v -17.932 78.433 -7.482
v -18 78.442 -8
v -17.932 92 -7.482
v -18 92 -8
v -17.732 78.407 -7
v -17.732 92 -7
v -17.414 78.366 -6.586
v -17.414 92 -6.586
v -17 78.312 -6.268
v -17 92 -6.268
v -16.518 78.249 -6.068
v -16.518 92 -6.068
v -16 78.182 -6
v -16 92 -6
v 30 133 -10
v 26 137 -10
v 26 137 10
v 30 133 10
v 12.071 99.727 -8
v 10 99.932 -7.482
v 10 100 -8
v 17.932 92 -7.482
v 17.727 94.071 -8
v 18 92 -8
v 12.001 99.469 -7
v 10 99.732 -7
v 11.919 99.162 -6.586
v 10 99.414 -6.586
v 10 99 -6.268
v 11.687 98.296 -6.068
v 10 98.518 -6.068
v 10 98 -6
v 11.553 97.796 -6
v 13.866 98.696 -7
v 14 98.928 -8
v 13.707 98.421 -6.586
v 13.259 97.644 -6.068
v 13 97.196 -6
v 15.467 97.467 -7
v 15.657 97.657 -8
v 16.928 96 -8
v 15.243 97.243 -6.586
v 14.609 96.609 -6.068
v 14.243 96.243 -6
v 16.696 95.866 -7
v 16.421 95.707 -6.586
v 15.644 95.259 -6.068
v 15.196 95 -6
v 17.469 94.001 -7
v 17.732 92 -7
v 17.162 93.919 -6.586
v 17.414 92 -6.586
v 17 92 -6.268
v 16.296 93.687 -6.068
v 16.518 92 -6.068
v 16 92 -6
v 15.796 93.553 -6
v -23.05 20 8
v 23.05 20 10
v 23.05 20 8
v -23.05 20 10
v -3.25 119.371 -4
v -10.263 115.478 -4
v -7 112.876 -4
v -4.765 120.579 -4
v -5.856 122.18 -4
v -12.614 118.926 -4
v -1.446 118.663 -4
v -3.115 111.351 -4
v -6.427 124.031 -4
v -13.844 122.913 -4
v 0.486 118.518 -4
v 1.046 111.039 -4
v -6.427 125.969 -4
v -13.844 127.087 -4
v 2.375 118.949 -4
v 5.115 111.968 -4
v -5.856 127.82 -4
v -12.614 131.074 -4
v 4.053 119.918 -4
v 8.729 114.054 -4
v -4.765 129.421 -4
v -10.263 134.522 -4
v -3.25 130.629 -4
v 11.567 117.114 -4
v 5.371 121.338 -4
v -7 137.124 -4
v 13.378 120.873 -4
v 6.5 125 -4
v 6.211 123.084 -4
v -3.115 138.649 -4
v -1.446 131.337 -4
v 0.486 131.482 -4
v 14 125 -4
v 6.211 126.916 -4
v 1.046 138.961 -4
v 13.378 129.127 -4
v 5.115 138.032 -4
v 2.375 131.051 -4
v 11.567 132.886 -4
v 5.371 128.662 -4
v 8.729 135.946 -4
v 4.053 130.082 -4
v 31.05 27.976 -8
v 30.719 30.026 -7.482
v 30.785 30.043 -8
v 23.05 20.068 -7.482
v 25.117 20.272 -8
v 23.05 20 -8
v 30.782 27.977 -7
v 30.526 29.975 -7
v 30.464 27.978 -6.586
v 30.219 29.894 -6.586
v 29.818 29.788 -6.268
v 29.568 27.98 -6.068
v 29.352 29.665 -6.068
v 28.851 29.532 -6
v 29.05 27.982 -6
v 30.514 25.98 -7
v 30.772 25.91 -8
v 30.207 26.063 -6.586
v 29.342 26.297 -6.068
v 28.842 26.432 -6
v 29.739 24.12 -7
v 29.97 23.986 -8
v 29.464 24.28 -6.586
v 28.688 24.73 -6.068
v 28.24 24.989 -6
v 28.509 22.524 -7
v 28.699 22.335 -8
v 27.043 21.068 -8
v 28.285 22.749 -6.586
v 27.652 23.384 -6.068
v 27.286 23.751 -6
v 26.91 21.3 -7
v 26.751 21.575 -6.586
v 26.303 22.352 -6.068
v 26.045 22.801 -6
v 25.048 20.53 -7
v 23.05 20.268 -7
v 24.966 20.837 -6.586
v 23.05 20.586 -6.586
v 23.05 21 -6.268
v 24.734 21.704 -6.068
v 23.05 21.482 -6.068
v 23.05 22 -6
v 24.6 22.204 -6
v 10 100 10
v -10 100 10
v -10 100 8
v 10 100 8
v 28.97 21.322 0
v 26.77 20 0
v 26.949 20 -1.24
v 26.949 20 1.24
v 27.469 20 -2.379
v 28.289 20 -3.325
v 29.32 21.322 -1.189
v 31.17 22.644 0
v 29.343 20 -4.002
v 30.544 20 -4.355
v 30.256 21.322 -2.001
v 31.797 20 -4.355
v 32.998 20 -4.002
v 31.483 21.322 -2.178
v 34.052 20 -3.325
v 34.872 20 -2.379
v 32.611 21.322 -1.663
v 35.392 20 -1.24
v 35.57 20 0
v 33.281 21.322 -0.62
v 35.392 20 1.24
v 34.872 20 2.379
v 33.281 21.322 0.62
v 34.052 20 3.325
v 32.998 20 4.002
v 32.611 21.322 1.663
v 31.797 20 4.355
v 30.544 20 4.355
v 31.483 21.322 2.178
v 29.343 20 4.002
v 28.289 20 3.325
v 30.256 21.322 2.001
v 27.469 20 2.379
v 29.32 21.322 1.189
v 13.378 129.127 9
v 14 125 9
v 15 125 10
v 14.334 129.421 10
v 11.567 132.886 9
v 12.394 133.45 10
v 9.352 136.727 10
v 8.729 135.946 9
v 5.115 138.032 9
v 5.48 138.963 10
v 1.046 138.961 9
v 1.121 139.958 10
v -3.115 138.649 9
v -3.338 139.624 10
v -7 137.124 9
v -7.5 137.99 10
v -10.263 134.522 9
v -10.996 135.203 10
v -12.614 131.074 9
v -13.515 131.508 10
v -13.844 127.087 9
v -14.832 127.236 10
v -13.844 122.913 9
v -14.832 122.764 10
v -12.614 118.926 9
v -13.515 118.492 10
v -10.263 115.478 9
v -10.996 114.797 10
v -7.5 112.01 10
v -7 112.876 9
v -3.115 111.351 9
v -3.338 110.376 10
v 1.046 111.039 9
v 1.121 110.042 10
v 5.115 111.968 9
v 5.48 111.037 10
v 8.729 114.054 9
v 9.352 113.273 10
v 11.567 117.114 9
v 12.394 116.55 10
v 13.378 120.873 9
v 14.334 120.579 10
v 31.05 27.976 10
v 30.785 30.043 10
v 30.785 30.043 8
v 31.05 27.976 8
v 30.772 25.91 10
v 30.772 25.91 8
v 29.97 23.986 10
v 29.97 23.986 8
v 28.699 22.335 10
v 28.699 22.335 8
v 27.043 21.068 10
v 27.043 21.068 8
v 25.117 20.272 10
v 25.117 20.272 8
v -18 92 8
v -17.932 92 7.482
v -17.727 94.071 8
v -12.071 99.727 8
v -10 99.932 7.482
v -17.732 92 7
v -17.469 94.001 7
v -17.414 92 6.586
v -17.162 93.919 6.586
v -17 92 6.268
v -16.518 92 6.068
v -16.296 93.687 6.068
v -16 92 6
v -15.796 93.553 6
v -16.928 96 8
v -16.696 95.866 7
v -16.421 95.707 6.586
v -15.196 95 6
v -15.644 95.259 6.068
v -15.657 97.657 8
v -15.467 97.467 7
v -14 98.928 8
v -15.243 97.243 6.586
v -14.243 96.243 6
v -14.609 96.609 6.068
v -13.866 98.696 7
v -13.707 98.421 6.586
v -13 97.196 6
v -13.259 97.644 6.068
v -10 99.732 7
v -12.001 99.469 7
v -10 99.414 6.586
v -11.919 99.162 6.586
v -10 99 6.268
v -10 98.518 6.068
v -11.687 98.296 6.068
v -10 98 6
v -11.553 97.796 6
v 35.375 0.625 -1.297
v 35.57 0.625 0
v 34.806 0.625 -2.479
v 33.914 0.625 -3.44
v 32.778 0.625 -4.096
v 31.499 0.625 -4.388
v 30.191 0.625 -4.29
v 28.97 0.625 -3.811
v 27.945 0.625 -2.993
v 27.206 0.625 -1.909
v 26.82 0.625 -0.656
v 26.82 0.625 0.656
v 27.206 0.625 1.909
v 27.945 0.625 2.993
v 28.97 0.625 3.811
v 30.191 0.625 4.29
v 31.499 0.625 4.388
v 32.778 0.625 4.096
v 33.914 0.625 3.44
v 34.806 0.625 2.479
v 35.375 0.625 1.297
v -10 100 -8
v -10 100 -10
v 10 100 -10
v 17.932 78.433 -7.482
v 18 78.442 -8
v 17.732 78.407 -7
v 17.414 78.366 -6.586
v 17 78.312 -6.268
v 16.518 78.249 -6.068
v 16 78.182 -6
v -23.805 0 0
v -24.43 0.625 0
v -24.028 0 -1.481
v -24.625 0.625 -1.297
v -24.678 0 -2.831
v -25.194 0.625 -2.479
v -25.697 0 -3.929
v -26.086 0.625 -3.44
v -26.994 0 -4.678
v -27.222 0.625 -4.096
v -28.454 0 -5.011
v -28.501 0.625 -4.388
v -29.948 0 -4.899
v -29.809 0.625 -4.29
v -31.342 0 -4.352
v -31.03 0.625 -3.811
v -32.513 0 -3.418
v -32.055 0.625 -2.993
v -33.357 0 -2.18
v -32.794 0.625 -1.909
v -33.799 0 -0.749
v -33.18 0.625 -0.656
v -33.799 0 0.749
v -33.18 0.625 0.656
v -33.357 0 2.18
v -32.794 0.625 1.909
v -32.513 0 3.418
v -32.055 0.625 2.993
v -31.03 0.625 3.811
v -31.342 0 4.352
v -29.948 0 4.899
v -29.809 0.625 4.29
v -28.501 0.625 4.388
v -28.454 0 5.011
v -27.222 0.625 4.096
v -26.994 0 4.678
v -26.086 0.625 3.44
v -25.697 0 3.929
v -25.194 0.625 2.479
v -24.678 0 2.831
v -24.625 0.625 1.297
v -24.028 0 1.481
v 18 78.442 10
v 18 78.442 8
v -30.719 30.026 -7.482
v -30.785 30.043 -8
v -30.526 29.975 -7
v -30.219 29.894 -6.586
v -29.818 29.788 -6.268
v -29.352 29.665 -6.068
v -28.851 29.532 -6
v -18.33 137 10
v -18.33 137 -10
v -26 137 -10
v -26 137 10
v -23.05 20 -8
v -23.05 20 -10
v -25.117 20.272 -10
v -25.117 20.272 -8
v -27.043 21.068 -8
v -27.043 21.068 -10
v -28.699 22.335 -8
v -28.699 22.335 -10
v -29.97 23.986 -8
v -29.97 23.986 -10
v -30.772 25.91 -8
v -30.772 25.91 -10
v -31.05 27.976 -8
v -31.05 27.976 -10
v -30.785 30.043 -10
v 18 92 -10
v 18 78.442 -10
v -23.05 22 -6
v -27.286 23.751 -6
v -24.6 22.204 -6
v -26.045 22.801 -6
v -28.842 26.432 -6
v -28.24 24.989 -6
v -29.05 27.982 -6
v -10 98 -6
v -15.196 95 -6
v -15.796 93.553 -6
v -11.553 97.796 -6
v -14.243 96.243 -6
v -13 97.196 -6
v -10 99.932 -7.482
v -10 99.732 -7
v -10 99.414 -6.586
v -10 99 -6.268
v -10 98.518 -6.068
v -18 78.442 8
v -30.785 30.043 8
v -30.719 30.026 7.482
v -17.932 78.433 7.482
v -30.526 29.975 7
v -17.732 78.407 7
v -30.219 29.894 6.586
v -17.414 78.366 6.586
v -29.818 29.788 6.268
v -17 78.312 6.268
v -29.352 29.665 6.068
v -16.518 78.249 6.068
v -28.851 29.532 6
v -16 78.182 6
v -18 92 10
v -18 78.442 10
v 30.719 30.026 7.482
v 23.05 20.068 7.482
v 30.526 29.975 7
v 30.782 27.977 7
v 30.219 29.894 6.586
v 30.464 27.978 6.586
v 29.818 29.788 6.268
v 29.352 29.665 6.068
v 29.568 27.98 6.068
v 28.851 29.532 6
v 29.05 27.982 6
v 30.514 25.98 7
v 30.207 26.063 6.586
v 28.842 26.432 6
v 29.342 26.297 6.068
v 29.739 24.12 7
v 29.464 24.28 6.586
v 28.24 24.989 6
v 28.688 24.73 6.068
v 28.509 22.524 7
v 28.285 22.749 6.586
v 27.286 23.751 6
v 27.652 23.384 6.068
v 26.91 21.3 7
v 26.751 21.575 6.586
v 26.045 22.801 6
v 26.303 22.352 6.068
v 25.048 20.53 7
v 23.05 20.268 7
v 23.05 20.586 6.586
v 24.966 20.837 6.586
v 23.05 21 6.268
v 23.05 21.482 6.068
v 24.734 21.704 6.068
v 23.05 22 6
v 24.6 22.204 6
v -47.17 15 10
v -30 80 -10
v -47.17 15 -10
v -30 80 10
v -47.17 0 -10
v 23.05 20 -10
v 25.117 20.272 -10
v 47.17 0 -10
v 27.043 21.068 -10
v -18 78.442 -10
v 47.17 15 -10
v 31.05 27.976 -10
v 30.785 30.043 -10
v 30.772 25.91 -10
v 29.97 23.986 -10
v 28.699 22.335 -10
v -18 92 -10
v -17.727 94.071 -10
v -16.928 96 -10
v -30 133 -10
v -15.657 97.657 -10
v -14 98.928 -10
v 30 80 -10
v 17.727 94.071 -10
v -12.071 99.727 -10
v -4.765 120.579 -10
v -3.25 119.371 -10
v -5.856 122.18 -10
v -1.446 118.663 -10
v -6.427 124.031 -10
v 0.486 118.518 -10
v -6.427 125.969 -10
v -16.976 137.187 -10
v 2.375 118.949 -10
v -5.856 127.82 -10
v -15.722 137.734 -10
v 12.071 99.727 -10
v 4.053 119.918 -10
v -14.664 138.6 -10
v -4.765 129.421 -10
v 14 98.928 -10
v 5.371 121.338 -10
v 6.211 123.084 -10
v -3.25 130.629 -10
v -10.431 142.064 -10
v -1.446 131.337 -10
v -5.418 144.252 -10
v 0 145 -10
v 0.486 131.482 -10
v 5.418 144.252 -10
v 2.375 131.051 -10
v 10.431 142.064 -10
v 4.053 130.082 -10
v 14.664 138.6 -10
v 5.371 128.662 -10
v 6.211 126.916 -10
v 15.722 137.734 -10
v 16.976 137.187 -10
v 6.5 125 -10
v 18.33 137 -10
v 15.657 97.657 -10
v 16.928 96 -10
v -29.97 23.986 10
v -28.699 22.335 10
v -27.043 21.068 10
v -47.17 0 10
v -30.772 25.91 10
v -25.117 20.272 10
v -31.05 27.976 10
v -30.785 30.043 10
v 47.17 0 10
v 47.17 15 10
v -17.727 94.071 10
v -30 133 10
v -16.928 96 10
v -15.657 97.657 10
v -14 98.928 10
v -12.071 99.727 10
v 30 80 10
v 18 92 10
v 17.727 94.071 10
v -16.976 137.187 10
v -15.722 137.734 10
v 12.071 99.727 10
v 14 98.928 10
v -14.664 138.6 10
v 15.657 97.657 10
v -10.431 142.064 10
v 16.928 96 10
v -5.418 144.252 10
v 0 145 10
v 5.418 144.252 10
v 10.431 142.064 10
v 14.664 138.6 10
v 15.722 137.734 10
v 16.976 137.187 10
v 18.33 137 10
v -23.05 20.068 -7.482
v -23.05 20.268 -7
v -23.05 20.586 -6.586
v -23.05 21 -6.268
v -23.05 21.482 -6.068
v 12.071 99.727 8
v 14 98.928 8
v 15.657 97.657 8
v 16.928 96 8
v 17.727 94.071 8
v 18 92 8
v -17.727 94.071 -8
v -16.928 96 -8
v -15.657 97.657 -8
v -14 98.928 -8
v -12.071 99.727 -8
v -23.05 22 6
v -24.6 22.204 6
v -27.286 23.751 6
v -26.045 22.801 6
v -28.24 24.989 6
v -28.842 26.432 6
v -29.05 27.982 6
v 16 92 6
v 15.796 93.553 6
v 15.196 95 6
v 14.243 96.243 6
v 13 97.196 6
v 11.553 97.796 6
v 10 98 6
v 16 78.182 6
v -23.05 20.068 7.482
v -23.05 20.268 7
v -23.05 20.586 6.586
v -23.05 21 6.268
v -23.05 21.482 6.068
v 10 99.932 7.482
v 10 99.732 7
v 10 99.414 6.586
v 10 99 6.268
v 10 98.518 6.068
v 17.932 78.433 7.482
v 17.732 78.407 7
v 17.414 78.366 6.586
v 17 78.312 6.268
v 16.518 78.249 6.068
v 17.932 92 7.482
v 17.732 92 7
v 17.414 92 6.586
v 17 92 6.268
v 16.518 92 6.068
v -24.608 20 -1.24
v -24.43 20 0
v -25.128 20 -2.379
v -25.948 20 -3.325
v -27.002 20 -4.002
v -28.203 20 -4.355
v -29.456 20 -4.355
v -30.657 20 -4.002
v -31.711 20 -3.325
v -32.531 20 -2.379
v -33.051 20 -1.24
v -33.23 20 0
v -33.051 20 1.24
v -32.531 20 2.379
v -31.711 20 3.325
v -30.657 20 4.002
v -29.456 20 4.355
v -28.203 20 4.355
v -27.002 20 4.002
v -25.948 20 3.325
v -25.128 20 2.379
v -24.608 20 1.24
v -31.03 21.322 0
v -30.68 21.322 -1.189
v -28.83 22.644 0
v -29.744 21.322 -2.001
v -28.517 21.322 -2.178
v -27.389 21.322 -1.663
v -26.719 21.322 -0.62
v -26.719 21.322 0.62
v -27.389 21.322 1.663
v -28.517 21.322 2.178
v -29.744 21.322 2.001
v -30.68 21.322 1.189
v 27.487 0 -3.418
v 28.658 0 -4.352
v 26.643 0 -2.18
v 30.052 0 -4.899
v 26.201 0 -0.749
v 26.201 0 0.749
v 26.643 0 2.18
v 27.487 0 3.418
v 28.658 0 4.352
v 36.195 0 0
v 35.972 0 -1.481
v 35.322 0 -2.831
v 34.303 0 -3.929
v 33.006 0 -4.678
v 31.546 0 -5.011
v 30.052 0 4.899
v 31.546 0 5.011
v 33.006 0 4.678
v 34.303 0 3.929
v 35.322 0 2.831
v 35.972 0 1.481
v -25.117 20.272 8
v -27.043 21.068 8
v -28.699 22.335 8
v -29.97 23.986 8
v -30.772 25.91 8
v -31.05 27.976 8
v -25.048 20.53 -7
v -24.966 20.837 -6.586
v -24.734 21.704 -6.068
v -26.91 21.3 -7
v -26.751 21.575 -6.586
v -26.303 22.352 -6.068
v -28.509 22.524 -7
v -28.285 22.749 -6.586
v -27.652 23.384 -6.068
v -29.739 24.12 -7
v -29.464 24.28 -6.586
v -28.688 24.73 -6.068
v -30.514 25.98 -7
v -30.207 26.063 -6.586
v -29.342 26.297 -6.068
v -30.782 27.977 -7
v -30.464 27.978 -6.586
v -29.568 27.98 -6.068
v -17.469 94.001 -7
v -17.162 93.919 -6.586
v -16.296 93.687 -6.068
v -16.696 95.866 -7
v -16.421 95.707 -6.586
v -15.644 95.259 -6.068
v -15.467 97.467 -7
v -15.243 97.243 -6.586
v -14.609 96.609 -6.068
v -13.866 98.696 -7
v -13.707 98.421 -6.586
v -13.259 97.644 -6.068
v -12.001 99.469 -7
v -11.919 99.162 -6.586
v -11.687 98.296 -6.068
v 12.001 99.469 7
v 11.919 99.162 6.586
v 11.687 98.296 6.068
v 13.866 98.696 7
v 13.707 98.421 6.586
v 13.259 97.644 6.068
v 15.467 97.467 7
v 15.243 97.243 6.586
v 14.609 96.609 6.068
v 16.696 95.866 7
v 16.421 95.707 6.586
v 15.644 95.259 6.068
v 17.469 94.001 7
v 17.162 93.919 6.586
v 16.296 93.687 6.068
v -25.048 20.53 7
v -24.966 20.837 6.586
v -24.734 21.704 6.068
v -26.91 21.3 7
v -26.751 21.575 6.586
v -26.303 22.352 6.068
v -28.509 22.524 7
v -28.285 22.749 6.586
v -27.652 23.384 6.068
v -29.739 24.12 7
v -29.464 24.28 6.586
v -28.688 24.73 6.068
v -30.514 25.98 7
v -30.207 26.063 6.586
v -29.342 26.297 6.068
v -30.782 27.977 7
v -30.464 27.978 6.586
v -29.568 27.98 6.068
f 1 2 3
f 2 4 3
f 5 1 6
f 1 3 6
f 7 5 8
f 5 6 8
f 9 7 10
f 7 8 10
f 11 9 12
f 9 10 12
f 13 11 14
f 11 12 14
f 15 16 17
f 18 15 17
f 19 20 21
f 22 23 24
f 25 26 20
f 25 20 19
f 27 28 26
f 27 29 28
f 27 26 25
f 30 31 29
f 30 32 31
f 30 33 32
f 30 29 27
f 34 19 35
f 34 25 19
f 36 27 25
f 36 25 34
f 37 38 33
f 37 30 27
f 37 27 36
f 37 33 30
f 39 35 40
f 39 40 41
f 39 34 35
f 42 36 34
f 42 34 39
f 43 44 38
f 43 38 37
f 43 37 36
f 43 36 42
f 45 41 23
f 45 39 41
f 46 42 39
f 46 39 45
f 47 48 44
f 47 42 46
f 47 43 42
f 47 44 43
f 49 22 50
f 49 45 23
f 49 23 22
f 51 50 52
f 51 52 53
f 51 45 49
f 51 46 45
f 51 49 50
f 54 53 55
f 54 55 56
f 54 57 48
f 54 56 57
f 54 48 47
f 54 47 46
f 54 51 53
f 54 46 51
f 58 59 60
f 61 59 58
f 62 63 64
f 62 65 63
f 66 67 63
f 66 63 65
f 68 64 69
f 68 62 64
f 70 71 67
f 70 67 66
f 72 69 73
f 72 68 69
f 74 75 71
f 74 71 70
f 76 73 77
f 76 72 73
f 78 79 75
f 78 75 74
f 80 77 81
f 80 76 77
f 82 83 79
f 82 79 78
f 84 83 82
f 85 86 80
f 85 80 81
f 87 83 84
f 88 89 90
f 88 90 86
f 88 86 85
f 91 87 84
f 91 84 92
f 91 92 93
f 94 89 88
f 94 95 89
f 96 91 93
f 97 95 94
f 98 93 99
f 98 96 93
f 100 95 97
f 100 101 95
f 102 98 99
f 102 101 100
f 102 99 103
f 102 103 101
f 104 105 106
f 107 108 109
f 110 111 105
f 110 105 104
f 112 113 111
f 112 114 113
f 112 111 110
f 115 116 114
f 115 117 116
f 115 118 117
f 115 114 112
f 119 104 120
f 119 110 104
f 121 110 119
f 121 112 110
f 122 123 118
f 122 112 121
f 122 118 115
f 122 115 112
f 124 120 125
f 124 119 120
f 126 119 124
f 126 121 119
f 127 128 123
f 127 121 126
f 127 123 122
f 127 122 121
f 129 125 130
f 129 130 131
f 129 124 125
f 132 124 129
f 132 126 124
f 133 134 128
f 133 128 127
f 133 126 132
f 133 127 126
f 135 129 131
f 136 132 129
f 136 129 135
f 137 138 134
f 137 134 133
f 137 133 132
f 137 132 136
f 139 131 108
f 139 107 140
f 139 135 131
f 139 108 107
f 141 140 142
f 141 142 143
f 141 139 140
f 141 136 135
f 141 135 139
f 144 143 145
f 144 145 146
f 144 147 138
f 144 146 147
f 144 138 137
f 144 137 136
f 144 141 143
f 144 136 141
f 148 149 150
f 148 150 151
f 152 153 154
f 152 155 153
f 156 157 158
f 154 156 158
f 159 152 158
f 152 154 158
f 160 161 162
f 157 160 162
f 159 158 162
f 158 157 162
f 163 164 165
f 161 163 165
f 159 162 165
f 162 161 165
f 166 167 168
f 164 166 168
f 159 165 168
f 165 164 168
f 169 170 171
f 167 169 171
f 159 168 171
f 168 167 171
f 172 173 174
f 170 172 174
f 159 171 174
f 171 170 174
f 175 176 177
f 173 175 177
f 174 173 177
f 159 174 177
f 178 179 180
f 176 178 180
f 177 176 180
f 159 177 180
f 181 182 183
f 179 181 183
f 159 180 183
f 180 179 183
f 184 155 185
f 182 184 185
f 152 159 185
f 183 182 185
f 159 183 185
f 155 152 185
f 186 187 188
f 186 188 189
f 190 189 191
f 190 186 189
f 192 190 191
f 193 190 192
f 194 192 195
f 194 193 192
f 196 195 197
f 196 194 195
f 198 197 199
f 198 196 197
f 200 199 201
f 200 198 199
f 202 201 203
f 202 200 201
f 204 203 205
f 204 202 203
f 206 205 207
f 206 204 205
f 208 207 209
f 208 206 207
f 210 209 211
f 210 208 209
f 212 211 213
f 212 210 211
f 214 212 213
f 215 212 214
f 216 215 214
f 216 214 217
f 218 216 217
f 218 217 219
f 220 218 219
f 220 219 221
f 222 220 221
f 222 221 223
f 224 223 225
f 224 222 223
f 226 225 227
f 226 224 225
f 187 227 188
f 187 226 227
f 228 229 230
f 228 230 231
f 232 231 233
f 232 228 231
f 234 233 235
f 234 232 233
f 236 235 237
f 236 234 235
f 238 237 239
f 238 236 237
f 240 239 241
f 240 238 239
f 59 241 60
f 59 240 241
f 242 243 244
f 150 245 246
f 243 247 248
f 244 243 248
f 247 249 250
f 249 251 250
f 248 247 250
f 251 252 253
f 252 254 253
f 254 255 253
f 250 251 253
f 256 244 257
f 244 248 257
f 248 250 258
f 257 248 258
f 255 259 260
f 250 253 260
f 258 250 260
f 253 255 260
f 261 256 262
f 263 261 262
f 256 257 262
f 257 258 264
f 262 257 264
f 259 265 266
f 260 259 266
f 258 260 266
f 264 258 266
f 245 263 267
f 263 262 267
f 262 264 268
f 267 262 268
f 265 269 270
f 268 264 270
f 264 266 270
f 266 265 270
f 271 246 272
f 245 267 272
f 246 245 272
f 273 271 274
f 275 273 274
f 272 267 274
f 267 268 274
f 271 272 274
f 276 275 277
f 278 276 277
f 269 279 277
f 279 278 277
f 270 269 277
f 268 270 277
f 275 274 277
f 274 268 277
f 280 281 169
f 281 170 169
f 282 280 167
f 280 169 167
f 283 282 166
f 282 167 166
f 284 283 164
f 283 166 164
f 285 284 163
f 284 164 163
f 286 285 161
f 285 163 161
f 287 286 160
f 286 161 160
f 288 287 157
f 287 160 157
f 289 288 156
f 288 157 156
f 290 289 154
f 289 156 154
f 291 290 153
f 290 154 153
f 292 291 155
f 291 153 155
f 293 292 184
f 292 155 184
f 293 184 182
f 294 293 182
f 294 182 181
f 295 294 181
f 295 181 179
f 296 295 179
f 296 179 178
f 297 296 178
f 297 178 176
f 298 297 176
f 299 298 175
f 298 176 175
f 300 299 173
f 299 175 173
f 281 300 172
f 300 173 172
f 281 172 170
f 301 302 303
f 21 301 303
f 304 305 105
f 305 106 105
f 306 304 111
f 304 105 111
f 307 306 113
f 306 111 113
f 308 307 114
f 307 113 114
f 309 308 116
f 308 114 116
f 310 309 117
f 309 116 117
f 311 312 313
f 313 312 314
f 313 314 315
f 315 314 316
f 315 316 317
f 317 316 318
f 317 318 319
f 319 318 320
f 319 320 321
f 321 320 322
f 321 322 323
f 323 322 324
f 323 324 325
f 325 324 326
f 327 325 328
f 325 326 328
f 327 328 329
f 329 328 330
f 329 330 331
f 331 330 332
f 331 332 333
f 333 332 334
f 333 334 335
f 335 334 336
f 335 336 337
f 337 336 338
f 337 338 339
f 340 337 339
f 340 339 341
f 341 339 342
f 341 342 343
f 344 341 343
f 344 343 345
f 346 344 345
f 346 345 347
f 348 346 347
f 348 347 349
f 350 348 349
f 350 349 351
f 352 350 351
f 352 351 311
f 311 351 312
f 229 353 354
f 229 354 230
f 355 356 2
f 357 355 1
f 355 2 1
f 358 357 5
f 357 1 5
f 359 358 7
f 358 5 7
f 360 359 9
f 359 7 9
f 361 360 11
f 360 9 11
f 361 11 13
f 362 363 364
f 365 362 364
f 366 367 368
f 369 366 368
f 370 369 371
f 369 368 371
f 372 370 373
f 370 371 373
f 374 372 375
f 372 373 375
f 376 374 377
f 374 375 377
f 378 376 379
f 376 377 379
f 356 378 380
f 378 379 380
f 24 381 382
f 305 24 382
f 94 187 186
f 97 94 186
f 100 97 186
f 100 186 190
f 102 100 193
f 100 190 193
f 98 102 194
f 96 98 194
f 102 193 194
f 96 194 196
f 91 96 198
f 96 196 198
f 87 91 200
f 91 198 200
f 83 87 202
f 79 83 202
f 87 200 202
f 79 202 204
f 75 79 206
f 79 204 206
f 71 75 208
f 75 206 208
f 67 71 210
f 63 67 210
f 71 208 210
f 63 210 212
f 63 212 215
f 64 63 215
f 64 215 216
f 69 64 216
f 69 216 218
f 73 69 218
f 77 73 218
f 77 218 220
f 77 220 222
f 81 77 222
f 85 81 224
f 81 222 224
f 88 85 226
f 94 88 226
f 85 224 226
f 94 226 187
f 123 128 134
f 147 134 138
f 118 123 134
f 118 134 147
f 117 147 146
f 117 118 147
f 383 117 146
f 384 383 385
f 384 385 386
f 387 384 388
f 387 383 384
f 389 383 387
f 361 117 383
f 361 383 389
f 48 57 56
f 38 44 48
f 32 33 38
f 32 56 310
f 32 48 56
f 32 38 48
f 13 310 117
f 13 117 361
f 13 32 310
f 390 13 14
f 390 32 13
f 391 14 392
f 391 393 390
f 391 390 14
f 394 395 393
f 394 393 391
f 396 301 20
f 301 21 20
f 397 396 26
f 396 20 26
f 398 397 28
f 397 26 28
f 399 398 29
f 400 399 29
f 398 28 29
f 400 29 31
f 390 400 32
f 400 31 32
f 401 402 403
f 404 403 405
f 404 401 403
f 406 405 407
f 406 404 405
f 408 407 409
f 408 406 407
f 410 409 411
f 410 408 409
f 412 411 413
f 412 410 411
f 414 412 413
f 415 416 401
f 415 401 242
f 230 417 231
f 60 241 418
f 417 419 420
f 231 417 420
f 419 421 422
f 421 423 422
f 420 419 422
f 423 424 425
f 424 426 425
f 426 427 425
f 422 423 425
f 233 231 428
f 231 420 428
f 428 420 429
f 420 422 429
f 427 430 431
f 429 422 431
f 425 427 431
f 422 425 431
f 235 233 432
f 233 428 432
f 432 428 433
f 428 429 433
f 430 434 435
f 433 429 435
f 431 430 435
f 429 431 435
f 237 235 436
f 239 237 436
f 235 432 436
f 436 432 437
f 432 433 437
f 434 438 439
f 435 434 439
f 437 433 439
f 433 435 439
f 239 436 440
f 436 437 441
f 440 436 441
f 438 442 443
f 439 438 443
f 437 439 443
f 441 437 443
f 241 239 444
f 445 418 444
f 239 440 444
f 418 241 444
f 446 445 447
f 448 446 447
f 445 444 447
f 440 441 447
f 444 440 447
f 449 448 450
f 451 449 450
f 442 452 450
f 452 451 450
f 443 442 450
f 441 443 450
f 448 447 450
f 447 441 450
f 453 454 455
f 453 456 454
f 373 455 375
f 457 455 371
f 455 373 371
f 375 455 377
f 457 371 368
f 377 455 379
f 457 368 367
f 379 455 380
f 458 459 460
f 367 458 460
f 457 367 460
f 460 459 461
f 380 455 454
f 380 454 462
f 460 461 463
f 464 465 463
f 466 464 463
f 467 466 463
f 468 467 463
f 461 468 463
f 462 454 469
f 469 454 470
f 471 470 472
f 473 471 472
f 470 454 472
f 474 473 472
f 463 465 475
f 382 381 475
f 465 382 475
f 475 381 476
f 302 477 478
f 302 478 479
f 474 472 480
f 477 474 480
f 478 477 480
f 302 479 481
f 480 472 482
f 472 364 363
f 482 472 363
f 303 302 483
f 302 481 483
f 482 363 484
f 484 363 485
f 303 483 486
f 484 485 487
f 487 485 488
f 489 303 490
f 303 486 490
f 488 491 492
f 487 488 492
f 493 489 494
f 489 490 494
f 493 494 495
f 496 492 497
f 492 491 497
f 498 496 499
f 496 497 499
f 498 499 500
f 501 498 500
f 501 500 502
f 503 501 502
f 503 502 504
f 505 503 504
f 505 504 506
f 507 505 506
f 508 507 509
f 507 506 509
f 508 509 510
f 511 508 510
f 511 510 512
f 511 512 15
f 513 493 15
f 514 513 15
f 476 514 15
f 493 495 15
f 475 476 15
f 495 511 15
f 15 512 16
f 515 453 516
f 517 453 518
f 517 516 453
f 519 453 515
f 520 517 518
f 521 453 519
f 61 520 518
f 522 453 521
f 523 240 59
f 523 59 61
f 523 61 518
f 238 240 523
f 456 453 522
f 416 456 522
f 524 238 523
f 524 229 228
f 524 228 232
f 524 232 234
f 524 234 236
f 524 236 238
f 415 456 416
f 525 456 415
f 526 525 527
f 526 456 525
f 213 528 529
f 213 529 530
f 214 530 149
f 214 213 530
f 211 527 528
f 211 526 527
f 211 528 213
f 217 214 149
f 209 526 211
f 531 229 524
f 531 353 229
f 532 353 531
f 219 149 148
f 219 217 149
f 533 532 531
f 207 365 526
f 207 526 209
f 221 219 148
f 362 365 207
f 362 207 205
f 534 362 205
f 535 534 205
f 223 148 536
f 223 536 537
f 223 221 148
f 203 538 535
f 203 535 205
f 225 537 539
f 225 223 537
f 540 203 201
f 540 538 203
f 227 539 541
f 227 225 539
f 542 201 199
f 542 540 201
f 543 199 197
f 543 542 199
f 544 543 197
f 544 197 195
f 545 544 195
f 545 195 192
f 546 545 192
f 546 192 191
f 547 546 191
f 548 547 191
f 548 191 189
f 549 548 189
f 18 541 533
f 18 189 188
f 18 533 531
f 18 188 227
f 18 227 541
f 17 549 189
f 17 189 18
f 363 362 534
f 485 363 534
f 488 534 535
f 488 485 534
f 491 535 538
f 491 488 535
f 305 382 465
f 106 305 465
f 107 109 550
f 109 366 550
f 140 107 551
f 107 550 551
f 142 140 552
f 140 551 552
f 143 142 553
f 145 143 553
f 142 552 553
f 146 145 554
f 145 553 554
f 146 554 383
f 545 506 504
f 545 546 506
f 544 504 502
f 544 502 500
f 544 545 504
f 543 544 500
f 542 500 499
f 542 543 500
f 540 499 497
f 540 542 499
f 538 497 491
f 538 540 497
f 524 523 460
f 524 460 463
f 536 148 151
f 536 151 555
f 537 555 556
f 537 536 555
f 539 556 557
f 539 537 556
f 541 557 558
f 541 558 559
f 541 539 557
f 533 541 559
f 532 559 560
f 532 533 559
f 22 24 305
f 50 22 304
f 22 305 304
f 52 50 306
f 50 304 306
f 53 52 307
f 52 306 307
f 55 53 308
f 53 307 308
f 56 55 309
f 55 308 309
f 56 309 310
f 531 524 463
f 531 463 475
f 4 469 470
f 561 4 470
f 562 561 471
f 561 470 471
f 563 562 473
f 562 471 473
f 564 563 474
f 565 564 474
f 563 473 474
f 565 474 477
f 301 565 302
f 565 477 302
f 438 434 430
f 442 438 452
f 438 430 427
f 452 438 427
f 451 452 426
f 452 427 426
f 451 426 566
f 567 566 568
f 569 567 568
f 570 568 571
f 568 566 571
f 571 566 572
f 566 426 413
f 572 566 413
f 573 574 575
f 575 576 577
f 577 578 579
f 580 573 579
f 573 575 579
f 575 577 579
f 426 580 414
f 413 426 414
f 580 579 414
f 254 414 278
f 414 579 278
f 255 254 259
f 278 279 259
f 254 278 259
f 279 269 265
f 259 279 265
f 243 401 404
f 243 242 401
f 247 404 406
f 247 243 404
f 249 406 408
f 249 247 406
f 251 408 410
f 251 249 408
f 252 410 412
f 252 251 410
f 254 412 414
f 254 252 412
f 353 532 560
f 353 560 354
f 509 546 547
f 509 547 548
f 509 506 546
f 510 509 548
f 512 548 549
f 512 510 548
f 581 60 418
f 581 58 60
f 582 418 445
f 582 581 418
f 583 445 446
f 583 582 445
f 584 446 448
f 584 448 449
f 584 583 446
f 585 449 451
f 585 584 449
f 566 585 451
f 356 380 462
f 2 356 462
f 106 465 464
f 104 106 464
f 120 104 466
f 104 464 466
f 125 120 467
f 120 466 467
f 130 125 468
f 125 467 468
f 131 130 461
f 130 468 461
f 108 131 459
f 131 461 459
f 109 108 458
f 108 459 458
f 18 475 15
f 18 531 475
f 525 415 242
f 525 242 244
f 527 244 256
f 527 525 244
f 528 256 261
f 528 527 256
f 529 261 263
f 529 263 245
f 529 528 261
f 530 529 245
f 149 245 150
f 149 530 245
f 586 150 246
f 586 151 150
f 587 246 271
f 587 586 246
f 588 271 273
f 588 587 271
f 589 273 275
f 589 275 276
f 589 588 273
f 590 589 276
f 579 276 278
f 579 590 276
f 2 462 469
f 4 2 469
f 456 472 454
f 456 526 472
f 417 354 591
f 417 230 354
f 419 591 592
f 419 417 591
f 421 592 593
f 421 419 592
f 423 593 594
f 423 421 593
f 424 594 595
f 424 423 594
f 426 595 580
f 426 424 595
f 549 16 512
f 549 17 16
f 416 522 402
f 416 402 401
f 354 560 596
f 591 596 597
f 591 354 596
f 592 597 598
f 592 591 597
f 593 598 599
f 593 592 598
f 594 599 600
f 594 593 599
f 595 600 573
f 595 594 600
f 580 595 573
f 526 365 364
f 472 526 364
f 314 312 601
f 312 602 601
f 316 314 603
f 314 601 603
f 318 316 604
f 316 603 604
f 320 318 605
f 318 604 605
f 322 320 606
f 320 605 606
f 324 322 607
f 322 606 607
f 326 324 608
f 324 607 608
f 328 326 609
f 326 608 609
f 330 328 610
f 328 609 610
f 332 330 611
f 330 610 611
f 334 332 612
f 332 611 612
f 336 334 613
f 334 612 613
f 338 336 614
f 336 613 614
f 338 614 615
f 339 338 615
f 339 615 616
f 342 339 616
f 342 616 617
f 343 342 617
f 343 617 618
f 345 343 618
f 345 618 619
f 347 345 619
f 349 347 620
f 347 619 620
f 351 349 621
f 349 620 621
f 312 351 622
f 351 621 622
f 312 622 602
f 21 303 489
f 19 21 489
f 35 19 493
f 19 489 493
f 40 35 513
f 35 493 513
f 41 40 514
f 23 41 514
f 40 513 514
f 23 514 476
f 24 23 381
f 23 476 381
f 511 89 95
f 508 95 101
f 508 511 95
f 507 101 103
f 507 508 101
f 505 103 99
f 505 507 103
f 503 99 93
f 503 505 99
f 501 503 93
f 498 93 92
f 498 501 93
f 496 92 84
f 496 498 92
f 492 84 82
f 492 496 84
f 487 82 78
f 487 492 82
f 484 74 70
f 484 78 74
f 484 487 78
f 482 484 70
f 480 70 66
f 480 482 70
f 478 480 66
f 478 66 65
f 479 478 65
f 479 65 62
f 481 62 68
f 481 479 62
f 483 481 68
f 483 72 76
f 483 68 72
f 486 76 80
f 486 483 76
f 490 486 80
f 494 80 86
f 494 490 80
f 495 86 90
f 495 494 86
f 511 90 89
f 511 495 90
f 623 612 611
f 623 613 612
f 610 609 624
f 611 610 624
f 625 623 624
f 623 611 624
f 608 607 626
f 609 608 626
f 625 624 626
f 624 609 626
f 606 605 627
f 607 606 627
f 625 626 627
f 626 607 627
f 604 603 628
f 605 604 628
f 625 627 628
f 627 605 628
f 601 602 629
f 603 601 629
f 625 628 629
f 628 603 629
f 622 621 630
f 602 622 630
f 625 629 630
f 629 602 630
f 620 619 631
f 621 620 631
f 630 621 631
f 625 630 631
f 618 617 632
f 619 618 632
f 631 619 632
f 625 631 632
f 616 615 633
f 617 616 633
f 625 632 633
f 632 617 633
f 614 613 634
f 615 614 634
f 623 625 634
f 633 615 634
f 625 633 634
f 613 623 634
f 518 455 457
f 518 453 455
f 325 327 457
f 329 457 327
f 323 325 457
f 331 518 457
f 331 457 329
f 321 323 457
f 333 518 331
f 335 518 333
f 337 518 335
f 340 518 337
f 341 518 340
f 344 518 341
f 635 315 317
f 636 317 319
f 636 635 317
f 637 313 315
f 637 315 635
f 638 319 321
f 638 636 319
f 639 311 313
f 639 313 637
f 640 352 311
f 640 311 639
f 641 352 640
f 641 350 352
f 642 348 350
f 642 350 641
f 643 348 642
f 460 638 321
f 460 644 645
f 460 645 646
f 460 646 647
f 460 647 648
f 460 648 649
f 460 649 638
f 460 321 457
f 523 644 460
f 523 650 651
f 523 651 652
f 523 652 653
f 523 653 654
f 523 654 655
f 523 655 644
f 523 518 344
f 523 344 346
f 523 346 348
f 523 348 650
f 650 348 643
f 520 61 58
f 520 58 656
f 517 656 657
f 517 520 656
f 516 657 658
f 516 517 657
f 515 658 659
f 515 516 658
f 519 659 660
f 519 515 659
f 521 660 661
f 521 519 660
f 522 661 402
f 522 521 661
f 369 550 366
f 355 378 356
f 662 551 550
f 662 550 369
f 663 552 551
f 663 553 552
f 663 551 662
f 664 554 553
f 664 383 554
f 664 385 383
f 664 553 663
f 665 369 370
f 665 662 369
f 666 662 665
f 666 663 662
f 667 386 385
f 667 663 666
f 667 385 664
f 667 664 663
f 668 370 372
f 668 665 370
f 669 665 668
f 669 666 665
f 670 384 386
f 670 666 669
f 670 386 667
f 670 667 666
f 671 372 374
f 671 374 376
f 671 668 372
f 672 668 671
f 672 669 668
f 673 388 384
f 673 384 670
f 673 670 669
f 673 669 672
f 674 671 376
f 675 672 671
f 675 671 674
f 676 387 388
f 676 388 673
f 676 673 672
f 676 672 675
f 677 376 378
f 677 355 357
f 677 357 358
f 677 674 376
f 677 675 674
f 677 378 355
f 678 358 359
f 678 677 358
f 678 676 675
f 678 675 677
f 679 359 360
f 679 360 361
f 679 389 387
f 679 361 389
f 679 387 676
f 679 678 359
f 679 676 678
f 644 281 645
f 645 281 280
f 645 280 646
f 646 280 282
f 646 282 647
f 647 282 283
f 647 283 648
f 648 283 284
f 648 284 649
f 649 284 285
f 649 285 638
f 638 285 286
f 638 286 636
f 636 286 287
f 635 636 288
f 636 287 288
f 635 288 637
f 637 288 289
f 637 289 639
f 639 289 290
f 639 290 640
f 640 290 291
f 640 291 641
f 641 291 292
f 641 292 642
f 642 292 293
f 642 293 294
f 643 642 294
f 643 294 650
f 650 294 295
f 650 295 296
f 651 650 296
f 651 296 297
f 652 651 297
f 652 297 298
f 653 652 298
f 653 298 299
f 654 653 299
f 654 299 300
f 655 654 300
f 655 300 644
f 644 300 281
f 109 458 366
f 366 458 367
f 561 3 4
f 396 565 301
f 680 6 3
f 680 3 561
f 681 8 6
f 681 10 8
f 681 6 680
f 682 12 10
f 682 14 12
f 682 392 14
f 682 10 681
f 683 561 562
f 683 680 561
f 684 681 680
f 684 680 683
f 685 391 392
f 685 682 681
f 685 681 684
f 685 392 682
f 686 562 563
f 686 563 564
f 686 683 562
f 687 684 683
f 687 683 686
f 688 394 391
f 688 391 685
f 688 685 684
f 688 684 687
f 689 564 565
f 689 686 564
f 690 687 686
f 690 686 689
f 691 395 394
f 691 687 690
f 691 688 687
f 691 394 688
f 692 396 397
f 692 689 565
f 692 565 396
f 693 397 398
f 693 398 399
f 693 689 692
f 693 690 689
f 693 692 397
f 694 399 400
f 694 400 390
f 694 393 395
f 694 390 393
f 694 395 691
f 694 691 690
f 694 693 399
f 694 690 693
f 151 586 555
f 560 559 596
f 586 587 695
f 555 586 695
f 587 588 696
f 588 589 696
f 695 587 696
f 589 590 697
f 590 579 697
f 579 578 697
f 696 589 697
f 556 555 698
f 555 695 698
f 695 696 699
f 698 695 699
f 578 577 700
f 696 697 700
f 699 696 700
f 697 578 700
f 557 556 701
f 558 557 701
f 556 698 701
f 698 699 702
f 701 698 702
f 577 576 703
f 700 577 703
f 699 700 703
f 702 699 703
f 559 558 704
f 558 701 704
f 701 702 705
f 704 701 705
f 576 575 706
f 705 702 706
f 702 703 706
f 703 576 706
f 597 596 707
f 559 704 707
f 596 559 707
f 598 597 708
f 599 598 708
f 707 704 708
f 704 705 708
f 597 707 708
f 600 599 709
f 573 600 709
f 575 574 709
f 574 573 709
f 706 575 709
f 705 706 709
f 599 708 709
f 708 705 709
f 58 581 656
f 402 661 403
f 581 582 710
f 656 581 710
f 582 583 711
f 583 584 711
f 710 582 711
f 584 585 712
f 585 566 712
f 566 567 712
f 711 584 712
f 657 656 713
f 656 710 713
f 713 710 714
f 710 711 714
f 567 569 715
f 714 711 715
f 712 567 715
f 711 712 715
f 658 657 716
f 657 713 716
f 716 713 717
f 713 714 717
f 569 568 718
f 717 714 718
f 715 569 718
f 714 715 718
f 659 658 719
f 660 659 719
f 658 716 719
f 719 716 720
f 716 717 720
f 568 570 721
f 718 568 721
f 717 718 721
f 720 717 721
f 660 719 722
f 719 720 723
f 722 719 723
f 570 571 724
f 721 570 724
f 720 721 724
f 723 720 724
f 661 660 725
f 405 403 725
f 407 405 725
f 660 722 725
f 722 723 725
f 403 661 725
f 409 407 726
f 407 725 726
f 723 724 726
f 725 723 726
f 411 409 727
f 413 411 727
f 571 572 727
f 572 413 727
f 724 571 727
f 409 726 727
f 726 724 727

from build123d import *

# Parameters (mm, degrees)
SKETCH1_R                         = 6.5
BOSS_EXTRUDE1_DEPTH               = 10
SKETCH2_R                         = 14
CUT_EXTRUDE1_DEPTH                = 14
CHAMFER1_SIZE                     = 4
CHAMFER2_SIZE                     = 1
FILLET2_R                         = 5
CUT_EXTRUDE2_DEPTH                = 4
FILLET3_R                         = 2
FILLET3_OF_MIRROR1_R              = 2
M10X1_25_TAPPED_HOLE1_D           = 8.8
M10X1_25_TAPPED_HOLE1_DEPTH       = 20
M10X1_25_TAPPED_HOLE1_CSINK_D     = 10.05
M10X1_25_TAPPED_HOLE1_CSINK_ANGLE = 90
M10X1_25_TAPPED_HOLE1_TIP         = 2.643786724


with BuildPart() as part:
    # Sketch1 → Boss-Extrude1 (new, symmetric)
    with BuildSketch(Plane.XY):
        with BuildLine():
            Line((-47.170361299, 15), (-47.170361299, 0))
            Line((-47.170361299, 0), (47.170361299, 0))
            Line((47.170361299, 0), (47.170361299, 15))
            Line((47.170361299, 15), (30, 80))
            Line((30, 80), (30, 137))
            Line((30, 137), (16, 137))
            ThreePointArc((16, 137), (0, 145), (-16, 137))
            Line((-16, 137), (-30, 137))
            Line((-30, 137), (-30, 80))
            Line((-30, 80), (-47.170361299, 15))
        make_face()
        with Locations((0, 125)):
            Circle(SKETCH1_R, mode=Mode.SUBTRACT)
    extrude(amount=BOSS_EXTRUDE1_DEPTH, both=True)

    # Sketch2 → Cut-Extrude1 (cut)
    with BuildSketch(Plane.XY.offset(10)):
        with Locations((0, 125)):
            Circle(SKETCH2_R)
    extrude(amount=-CUT_EXTRUDE1_DEPTH, mode=Mode.SUBTRACT)

    # Chamfer1
    chamfer1_edges = [part.edges().sort_by_distance(p)[0] for p in [
        (30, 137, 0),
        (-30, 137, 0),
    ]]
    chamfer(chamfer1_edges, length=CHAMFER1_SIZE)

    # Chamfer2
    chamfer2_edges = [part.edges().sort_by_distance(p)[0] for p in [
        (-14, 125, 10),
    ]]
    chamfer(chamfer2_edges, length=CHAMFER2_SIZE)

    # Fillet2
    fillet2_edges = [part.edges().sort_by_distance(p)[0] for p in [
        (-16, 137, 0),
        (16, 137, 0),
    ]]
    fillet(fillet2_edges, radius=FILLET2_R)

    # Sketch3 → Cut-Extrude2 (cut)
    with BuildSketch(Plane.XY.offset(10)):
        with BuildLine():
            Line((-10, 100), (10, 100))
            ThreePointArc((10, 100), (15.656854249, 97.656854249), (18, 92))
            Line((18, 92), (18, 78.441768634))
            Line((18, 78.441768634), (30.784939674, 30.043190159))
            ThreePointArc((30.784939674, 30.043190159), (29.388451789, 23.118684669), (23.050253256, 20))
            Line((23.050253256, 20), (-23.050253256, 20))
            ThreePointArc((-23.050253256, 20), (-29.388451789, 23.118684669), (-30.784939674, 30.043190159))
            Line((-30.784939674, 30.043190159), (-18, 78.441768634))
            Line((-18, 78.441768634), (-18, 92))
            ThreePointArc((-18, 92), (-15.656854249, 97.656854249), (-10, 100))
        make_face()
    cut_extrude2 = extrude(amount=-CUT_EXTRUDE2_DEPTH, mode=Mode.SUBTRACT)

    # Fillet3
    fillet3_edges = [part.edges().sort_by_distance(p)[0] for p in [
        (-29.388451789, 23.118684669, 6),
        (-24.392469837, 54.242479397, 6),
        (-18, 85.220884317, 6),
        (-15.656854249, 97.656854249, 6),
        (0, 100, 6),
        (15.656854249, 97.656854249, 6),
        (18, 85.220884317, 6),
        (24.392469837, 54.242479397, 6),
        (29.388451789, 23.118684669, 6),
        (0, 20, 6),
    ]]
    fillet(fillet3_edges, radius=FILLET3_R)

    # Mirror1: Cut-Extrude2 across plane
    add(cut_extrude2.mirror(Plane.XY), mode=Mode.SUBTRACT)

    # Fillet3 of Mirror1
    fillet3_of_mirror1_edges = [part.edges().sort_by_distance(p)[0] for p in [
        (-29.388451789, 23.118684669, -6),
        (-24.392469837, 54.242479397, -6),
        (-18, 85.220884317, -6),
        (-15.656854249, 97.656854249, -6),
        (0, 100, -6),
        (15.656854249, 97.656854249, -6),
        (18, 85.220884317, -6),
        (24.392469837, 54.242479397, -6),
        (29.388451789, 23.118684669, -6),
        (0, 20, -6),
    ]]
    fillet(fillet3_of_mirror1_edges, radius=FILLET3_OF_MIRROR1_R)

    # M10x1.25 Tapped Hole1
    with Locations(Plane(origin=(0, 0, 0), x_dir=(-1, 0, 0), z_dir=(0, -1, 0))):
        with Locations((-31.170361299, 0), (28.829638701, 0)):
            CounterSinkHole(M10X1_25_TAPPED_HOLE1_D / 2, M10X1_25_TAPPED_HOLE1_CSINK_D / 2, depth=M10X1_25_TAPPED_HOLE1_DEPTH, counter_sink_angle=M10X1_25_TAPPED_HOLE1_CSINK_ANGLE)
            with Locations((0, 0, -(M10X1_25_TAPPED_HOLE1_DEPTH + M10X1_25_TAPPED_HOLE1_TIP / 2))):  # 118° drill point
                Cone(0, M10X1_25_TAPPED_HOLE1_D / 2, M10X1_25_TAPPED_HOLE1_TIP, mode=Mode.SUBTRACT)


solid = part.part
